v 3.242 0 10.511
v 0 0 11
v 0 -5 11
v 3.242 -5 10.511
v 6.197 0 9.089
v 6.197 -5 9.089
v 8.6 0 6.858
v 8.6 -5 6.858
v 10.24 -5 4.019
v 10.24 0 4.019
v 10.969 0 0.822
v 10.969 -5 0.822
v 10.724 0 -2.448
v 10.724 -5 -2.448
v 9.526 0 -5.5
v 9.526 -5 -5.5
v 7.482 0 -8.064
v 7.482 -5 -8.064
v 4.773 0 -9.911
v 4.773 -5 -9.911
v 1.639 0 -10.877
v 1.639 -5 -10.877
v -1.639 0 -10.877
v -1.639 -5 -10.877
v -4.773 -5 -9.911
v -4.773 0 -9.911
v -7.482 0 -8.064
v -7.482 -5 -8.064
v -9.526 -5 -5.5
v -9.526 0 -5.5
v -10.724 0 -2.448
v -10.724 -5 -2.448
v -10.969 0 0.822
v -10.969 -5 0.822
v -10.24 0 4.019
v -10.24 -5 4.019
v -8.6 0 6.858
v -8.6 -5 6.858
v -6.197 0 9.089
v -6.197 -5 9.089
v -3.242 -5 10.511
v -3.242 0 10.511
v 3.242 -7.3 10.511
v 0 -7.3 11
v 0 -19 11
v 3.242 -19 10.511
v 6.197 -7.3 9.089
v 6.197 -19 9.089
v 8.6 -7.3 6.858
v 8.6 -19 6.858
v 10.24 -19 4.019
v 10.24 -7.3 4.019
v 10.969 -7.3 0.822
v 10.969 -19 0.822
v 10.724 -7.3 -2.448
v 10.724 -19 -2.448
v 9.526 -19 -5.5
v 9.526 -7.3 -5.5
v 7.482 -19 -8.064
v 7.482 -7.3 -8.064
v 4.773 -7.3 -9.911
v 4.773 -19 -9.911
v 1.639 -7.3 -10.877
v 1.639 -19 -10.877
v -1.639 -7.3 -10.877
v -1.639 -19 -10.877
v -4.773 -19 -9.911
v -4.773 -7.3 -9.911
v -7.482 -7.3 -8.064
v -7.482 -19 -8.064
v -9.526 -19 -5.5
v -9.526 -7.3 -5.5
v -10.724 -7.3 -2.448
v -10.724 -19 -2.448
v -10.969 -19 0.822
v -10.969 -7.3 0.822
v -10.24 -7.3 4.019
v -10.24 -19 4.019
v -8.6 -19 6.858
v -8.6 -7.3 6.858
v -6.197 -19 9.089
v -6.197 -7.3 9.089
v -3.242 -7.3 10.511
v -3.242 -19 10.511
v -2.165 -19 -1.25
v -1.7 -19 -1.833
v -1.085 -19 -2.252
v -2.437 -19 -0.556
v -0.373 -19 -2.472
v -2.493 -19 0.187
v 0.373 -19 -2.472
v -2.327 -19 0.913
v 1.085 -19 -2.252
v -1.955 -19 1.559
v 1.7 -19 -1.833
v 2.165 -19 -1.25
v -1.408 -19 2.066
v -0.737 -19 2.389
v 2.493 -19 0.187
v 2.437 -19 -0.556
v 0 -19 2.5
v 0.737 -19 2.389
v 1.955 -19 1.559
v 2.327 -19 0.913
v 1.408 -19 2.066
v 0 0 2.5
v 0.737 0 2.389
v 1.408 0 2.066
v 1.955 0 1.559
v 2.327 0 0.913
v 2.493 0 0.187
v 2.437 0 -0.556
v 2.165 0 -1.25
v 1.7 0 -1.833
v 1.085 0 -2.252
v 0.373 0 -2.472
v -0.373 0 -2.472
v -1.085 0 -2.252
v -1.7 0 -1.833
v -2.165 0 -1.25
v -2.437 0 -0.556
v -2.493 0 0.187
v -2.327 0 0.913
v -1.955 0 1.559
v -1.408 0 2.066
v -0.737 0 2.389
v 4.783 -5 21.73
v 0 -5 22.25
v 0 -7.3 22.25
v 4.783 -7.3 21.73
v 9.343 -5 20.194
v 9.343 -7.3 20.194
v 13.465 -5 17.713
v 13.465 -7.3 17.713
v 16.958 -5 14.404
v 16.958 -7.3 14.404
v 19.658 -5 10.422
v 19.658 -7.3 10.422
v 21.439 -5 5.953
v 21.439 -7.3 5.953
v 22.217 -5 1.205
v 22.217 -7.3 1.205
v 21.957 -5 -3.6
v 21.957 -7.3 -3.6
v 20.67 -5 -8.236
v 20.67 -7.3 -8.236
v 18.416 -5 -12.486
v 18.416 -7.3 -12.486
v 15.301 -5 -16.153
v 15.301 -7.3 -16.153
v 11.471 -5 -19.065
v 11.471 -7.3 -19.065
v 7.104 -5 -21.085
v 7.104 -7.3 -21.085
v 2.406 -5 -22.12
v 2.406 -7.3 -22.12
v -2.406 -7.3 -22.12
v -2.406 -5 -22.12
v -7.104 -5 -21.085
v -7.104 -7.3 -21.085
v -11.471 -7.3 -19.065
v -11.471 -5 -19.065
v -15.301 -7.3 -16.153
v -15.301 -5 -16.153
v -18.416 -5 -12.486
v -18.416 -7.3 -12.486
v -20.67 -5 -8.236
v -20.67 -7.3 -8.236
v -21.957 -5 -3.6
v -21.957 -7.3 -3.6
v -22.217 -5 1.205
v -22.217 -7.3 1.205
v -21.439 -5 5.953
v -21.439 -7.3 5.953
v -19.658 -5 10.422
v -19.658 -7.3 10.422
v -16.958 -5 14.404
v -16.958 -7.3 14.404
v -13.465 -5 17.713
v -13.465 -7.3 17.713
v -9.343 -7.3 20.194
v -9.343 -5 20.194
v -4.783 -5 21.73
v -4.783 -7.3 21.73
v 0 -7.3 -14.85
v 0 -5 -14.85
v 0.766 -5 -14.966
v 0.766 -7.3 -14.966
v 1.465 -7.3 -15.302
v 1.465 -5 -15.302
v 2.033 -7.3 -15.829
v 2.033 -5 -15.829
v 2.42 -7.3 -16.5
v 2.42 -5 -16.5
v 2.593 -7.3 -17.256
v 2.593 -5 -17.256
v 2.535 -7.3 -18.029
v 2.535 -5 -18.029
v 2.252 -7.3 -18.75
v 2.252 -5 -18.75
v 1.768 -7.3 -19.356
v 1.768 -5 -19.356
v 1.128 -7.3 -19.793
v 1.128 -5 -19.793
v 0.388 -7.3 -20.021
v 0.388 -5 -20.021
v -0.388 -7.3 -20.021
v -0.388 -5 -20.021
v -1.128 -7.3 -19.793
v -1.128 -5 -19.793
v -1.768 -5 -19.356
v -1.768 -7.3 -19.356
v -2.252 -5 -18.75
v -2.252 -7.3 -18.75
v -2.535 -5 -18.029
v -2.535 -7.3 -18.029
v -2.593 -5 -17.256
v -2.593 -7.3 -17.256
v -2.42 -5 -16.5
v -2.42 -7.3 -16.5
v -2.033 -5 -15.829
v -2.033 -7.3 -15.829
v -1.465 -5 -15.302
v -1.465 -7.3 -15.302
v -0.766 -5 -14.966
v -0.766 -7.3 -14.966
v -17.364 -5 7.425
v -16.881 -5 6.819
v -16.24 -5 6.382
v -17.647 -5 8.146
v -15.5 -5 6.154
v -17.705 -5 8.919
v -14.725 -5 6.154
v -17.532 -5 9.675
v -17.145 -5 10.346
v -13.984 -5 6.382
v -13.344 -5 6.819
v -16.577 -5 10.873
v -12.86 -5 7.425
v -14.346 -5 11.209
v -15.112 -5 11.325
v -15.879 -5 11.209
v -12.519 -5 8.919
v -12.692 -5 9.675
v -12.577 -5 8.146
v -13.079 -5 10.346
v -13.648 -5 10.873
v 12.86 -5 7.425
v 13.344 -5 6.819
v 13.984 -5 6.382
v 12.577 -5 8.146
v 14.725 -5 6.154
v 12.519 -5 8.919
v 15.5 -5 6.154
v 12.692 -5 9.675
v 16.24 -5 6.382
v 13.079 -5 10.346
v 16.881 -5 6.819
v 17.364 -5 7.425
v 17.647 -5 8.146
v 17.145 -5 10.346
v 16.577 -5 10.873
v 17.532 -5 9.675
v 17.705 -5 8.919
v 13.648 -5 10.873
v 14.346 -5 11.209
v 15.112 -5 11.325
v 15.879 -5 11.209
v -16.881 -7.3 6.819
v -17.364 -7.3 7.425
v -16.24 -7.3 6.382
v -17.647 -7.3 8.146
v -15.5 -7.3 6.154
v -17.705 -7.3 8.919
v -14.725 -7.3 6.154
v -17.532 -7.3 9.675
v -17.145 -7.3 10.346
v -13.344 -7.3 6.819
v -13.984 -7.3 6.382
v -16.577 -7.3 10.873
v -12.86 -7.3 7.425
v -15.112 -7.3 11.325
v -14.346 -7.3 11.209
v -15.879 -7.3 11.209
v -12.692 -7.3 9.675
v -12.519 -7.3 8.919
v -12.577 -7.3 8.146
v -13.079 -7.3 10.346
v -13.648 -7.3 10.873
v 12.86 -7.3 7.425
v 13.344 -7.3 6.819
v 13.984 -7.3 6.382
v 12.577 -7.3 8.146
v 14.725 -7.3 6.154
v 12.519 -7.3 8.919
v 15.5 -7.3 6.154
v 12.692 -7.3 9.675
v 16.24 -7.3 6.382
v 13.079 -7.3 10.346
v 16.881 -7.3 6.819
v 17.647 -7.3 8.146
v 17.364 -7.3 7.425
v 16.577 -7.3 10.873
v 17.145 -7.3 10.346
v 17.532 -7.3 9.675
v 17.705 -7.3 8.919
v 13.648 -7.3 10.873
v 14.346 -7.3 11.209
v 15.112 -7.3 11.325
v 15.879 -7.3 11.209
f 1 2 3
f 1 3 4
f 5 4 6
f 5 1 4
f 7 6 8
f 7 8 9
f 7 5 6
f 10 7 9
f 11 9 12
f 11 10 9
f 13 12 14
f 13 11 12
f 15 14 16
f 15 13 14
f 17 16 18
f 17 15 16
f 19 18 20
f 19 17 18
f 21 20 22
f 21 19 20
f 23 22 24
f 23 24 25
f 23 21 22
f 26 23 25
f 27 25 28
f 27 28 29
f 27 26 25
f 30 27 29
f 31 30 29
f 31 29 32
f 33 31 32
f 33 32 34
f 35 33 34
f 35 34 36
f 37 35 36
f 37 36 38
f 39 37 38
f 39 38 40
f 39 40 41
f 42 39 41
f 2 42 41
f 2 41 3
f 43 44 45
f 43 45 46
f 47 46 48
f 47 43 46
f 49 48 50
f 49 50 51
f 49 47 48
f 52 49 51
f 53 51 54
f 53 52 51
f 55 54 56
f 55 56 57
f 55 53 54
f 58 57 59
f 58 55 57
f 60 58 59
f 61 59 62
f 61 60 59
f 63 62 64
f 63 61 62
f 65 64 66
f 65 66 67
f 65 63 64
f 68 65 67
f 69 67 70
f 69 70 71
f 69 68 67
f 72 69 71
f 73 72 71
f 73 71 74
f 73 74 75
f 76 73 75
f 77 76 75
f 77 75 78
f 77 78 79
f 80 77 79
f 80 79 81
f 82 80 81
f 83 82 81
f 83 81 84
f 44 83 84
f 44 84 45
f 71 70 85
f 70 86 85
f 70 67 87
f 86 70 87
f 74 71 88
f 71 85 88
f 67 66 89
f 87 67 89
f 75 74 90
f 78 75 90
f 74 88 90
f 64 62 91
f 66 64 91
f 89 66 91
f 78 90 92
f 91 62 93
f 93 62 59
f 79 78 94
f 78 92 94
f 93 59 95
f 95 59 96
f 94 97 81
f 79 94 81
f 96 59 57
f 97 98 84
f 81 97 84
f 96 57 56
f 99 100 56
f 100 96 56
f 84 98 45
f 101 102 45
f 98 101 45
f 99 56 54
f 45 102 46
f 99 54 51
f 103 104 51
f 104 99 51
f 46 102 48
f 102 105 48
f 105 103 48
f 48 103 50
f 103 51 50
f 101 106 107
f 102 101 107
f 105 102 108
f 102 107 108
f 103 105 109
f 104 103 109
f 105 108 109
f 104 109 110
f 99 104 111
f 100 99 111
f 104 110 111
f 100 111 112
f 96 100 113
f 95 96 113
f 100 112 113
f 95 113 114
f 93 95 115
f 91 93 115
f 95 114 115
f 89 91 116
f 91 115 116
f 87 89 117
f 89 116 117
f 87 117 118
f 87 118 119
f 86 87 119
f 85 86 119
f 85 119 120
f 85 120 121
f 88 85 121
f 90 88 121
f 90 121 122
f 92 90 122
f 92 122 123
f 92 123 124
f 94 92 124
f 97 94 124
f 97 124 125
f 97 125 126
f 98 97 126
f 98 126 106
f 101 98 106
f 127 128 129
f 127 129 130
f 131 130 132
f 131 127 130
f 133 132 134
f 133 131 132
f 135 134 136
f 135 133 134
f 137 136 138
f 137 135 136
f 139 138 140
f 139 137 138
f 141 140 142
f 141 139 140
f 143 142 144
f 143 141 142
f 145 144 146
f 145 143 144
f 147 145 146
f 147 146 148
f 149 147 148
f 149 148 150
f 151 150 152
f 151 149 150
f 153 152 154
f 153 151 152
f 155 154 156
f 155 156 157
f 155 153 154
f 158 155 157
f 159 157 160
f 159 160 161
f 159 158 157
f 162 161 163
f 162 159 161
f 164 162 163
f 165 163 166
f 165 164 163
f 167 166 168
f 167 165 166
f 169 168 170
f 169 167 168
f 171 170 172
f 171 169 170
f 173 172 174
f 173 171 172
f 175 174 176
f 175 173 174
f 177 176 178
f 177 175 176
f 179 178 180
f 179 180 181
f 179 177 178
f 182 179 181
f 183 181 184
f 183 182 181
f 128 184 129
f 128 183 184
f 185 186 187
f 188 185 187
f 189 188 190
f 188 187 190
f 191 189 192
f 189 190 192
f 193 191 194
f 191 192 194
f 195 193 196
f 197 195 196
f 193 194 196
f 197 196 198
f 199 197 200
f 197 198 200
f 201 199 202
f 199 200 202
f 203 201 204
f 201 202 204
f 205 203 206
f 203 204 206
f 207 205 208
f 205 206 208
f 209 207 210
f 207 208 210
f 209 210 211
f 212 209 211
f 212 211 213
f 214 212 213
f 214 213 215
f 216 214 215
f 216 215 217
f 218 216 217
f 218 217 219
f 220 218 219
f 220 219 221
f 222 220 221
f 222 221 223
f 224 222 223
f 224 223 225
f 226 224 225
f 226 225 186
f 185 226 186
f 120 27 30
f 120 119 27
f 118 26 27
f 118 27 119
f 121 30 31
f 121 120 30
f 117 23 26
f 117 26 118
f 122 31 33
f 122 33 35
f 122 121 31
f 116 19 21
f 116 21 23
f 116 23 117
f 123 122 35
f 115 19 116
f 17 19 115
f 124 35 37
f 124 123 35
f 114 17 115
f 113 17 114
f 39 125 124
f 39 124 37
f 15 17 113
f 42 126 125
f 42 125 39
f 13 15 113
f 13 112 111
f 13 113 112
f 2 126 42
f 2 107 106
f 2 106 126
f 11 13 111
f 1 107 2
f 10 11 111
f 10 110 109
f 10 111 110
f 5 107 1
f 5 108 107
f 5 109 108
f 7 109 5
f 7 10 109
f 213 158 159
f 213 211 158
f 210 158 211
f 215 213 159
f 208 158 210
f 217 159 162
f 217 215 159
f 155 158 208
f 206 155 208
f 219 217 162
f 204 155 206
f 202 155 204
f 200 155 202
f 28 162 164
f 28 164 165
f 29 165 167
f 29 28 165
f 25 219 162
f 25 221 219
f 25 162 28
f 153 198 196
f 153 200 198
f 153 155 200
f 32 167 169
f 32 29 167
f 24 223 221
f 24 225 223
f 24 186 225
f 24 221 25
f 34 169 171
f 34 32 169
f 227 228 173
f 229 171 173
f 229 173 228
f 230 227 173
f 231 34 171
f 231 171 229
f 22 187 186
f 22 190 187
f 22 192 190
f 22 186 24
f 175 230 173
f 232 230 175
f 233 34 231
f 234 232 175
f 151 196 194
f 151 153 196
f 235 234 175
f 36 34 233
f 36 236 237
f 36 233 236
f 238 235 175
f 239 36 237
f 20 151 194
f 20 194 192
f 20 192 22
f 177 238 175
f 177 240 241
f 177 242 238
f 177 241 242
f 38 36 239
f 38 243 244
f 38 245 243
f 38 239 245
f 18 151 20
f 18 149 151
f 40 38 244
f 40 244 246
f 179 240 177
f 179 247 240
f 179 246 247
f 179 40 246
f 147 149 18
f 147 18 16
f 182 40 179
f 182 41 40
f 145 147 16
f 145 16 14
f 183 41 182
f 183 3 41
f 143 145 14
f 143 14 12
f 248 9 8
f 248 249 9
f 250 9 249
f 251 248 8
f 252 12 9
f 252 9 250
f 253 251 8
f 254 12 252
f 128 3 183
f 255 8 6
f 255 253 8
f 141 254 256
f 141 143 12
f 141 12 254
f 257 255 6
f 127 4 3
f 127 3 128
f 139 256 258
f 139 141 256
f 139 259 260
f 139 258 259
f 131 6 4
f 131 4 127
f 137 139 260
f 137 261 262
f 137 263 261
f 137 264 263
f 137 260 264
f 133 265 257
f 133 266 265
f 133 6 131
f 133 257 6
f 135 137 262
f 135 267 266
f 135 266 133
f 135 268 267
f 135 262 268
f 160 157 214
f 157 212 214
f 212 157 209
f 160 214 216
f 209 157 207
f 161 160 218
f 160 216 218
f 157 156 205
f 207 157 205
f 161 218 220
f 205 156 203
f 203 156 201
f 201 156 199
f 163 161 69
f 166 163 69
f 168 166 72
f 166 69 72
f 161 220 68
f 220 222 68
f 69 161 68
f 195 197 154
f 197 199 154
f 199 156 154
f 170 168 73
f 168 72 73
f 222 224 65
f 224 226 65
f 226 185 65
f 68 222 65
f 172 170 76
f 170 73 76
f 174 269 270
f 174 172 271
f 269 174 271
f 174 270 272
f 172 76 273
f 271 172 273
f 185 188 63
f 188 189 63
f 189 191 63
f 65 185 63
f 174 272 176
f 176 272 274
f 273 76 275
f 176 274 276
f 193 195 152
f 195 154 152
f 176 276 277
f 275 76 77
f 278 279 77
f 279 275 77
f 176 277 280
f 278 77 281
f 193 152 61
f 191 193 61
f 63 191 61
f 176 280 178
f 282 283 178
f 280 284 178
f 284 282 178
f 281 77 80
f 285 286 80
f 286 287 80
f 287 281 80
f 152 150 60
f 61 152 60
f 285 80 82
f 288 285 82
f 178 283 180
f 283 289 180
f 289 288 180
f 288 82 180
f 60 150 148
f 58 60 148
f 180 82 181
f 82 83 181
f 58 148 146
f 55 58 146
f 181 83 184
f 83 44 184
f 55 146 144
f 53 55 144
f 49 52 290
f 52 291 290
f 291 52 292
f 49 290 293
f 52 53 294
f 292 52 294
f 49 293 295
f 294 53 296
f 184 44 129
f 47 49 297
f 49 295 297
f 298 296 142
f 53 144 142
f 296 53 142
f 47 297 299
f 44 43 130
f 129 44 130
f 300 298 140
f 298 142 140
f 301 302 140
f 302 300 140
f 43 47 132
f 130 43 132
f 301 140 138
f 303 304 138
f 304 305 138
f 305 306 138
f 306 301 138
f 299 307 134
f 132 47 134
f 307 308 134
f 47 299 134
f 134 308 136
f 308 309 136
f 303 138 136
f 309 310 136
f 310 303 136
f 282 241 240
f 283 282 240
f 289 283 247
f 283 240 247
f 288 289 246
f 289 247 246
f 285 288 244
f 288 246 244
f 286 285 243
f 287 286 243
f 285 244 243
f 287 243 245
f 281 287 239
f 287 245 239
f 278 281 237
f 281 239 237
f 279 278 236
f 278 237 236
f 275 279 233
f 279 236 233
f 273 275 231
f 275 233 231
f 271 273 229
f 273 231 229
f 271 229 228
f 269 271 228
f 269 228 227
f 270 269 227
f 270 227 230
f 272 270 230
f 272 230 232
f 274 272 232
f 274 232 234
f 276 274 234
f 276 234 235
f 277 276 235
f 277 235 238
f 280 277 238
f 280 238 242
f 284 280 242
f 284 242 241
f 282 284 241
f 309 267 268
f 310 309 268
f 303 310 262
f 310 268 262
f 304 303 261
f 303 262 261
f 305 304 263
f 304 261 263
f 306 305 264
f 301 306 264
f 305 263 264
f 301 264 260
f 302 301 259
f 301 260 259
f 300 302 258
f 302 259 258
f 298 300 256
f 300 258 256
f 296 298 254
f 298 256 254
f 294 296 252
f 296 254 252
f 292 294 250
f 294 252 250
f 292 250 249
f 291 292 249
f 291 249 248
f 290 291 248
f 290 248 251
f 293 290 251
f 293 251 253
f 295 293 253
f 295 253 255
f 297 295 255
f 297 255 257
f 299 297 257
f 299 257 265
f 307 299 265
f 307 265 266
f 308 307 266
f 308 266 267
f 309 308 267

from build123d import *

# Parameters (mm, degrees)
SKETCH_1_R          = 11
EXTRUDE_1_DEPTH     = 19
SKETCH_2_R          = 22.25
EXTRUDE_2_DEPTH     = 2.3
SKETCH_3_R          = 2.6
CUT_EXTRUDE_1_DEPTH = 35.440165505
SKETCH_4_R          = 2.5
CUT_EXTRUDE_2_DEPTH = 37.757652265


with BuildPart() as part:
    # 草图1 → 凸台-拉伸1 (new body)
    with BuildSketch(Plane(origin=(0, 0, 0), x_dir=(1, 0, 0), z_dir=(0, 1, 0))):
        with Locations(Location((0, 0, 0), (0, 0, 270))):
            Circle(SKETCH_1_R)
    extrude(amount=-EXTRUDE_1_DEPTH)

    # 草图2 → 凸台-拉伸2 (add)
    with BuildSketch(Plane(origin=(0, -5, 0), x_dir=(1, 0, 0), z_dir=(0, 1, 0))):
        with Locations(Location((0, 0, 0), (0, 0, 270))):
            Circle(SKETCH_2_R)
    extrude(amount=-EXTRUDE_2_DEPTH)

    # 草图3 → 切除-拉伸1 (cut, through all)
    with BuildSketch(Plane(origin=(0, -5, 0), x_dir=(1, 0, 0), z_dir=(0, 1, 0))):
        with Locations(Location((0, 17.45, 0), (0, 0, 270))):
            Circle(SKETCH_3_R)
        with Locations(Location((15.112143296, -8.725, 0), (0, 0, 270))):
            Circle(SKETCH_3_R)
        with Locations(Location((-15.112143296, -8.725, 0), (0, 0, 270))):
            Circle(SKETCH_3_R)
    extrude(amount=-CUT_EXTRUDE_1_DEPTH, mode=Mode.SUBTRACT)

    # 草图4 → 切除-拉伸2 (cut, through all)
    with BuildSketch(Plane(origin=(0, 0, 0), x_dir=(1, 0, 0), z_dir=(0, 1, 0))):
        with Locations(Location((0, 0, 0), (0, 0, 270))):
            Circle(SKETCH_4_R)
    extrude(amount=-CUT_EXTRUDE_2_DEPTH, mode=Mode.SUBTRACT)


solid = part.part
